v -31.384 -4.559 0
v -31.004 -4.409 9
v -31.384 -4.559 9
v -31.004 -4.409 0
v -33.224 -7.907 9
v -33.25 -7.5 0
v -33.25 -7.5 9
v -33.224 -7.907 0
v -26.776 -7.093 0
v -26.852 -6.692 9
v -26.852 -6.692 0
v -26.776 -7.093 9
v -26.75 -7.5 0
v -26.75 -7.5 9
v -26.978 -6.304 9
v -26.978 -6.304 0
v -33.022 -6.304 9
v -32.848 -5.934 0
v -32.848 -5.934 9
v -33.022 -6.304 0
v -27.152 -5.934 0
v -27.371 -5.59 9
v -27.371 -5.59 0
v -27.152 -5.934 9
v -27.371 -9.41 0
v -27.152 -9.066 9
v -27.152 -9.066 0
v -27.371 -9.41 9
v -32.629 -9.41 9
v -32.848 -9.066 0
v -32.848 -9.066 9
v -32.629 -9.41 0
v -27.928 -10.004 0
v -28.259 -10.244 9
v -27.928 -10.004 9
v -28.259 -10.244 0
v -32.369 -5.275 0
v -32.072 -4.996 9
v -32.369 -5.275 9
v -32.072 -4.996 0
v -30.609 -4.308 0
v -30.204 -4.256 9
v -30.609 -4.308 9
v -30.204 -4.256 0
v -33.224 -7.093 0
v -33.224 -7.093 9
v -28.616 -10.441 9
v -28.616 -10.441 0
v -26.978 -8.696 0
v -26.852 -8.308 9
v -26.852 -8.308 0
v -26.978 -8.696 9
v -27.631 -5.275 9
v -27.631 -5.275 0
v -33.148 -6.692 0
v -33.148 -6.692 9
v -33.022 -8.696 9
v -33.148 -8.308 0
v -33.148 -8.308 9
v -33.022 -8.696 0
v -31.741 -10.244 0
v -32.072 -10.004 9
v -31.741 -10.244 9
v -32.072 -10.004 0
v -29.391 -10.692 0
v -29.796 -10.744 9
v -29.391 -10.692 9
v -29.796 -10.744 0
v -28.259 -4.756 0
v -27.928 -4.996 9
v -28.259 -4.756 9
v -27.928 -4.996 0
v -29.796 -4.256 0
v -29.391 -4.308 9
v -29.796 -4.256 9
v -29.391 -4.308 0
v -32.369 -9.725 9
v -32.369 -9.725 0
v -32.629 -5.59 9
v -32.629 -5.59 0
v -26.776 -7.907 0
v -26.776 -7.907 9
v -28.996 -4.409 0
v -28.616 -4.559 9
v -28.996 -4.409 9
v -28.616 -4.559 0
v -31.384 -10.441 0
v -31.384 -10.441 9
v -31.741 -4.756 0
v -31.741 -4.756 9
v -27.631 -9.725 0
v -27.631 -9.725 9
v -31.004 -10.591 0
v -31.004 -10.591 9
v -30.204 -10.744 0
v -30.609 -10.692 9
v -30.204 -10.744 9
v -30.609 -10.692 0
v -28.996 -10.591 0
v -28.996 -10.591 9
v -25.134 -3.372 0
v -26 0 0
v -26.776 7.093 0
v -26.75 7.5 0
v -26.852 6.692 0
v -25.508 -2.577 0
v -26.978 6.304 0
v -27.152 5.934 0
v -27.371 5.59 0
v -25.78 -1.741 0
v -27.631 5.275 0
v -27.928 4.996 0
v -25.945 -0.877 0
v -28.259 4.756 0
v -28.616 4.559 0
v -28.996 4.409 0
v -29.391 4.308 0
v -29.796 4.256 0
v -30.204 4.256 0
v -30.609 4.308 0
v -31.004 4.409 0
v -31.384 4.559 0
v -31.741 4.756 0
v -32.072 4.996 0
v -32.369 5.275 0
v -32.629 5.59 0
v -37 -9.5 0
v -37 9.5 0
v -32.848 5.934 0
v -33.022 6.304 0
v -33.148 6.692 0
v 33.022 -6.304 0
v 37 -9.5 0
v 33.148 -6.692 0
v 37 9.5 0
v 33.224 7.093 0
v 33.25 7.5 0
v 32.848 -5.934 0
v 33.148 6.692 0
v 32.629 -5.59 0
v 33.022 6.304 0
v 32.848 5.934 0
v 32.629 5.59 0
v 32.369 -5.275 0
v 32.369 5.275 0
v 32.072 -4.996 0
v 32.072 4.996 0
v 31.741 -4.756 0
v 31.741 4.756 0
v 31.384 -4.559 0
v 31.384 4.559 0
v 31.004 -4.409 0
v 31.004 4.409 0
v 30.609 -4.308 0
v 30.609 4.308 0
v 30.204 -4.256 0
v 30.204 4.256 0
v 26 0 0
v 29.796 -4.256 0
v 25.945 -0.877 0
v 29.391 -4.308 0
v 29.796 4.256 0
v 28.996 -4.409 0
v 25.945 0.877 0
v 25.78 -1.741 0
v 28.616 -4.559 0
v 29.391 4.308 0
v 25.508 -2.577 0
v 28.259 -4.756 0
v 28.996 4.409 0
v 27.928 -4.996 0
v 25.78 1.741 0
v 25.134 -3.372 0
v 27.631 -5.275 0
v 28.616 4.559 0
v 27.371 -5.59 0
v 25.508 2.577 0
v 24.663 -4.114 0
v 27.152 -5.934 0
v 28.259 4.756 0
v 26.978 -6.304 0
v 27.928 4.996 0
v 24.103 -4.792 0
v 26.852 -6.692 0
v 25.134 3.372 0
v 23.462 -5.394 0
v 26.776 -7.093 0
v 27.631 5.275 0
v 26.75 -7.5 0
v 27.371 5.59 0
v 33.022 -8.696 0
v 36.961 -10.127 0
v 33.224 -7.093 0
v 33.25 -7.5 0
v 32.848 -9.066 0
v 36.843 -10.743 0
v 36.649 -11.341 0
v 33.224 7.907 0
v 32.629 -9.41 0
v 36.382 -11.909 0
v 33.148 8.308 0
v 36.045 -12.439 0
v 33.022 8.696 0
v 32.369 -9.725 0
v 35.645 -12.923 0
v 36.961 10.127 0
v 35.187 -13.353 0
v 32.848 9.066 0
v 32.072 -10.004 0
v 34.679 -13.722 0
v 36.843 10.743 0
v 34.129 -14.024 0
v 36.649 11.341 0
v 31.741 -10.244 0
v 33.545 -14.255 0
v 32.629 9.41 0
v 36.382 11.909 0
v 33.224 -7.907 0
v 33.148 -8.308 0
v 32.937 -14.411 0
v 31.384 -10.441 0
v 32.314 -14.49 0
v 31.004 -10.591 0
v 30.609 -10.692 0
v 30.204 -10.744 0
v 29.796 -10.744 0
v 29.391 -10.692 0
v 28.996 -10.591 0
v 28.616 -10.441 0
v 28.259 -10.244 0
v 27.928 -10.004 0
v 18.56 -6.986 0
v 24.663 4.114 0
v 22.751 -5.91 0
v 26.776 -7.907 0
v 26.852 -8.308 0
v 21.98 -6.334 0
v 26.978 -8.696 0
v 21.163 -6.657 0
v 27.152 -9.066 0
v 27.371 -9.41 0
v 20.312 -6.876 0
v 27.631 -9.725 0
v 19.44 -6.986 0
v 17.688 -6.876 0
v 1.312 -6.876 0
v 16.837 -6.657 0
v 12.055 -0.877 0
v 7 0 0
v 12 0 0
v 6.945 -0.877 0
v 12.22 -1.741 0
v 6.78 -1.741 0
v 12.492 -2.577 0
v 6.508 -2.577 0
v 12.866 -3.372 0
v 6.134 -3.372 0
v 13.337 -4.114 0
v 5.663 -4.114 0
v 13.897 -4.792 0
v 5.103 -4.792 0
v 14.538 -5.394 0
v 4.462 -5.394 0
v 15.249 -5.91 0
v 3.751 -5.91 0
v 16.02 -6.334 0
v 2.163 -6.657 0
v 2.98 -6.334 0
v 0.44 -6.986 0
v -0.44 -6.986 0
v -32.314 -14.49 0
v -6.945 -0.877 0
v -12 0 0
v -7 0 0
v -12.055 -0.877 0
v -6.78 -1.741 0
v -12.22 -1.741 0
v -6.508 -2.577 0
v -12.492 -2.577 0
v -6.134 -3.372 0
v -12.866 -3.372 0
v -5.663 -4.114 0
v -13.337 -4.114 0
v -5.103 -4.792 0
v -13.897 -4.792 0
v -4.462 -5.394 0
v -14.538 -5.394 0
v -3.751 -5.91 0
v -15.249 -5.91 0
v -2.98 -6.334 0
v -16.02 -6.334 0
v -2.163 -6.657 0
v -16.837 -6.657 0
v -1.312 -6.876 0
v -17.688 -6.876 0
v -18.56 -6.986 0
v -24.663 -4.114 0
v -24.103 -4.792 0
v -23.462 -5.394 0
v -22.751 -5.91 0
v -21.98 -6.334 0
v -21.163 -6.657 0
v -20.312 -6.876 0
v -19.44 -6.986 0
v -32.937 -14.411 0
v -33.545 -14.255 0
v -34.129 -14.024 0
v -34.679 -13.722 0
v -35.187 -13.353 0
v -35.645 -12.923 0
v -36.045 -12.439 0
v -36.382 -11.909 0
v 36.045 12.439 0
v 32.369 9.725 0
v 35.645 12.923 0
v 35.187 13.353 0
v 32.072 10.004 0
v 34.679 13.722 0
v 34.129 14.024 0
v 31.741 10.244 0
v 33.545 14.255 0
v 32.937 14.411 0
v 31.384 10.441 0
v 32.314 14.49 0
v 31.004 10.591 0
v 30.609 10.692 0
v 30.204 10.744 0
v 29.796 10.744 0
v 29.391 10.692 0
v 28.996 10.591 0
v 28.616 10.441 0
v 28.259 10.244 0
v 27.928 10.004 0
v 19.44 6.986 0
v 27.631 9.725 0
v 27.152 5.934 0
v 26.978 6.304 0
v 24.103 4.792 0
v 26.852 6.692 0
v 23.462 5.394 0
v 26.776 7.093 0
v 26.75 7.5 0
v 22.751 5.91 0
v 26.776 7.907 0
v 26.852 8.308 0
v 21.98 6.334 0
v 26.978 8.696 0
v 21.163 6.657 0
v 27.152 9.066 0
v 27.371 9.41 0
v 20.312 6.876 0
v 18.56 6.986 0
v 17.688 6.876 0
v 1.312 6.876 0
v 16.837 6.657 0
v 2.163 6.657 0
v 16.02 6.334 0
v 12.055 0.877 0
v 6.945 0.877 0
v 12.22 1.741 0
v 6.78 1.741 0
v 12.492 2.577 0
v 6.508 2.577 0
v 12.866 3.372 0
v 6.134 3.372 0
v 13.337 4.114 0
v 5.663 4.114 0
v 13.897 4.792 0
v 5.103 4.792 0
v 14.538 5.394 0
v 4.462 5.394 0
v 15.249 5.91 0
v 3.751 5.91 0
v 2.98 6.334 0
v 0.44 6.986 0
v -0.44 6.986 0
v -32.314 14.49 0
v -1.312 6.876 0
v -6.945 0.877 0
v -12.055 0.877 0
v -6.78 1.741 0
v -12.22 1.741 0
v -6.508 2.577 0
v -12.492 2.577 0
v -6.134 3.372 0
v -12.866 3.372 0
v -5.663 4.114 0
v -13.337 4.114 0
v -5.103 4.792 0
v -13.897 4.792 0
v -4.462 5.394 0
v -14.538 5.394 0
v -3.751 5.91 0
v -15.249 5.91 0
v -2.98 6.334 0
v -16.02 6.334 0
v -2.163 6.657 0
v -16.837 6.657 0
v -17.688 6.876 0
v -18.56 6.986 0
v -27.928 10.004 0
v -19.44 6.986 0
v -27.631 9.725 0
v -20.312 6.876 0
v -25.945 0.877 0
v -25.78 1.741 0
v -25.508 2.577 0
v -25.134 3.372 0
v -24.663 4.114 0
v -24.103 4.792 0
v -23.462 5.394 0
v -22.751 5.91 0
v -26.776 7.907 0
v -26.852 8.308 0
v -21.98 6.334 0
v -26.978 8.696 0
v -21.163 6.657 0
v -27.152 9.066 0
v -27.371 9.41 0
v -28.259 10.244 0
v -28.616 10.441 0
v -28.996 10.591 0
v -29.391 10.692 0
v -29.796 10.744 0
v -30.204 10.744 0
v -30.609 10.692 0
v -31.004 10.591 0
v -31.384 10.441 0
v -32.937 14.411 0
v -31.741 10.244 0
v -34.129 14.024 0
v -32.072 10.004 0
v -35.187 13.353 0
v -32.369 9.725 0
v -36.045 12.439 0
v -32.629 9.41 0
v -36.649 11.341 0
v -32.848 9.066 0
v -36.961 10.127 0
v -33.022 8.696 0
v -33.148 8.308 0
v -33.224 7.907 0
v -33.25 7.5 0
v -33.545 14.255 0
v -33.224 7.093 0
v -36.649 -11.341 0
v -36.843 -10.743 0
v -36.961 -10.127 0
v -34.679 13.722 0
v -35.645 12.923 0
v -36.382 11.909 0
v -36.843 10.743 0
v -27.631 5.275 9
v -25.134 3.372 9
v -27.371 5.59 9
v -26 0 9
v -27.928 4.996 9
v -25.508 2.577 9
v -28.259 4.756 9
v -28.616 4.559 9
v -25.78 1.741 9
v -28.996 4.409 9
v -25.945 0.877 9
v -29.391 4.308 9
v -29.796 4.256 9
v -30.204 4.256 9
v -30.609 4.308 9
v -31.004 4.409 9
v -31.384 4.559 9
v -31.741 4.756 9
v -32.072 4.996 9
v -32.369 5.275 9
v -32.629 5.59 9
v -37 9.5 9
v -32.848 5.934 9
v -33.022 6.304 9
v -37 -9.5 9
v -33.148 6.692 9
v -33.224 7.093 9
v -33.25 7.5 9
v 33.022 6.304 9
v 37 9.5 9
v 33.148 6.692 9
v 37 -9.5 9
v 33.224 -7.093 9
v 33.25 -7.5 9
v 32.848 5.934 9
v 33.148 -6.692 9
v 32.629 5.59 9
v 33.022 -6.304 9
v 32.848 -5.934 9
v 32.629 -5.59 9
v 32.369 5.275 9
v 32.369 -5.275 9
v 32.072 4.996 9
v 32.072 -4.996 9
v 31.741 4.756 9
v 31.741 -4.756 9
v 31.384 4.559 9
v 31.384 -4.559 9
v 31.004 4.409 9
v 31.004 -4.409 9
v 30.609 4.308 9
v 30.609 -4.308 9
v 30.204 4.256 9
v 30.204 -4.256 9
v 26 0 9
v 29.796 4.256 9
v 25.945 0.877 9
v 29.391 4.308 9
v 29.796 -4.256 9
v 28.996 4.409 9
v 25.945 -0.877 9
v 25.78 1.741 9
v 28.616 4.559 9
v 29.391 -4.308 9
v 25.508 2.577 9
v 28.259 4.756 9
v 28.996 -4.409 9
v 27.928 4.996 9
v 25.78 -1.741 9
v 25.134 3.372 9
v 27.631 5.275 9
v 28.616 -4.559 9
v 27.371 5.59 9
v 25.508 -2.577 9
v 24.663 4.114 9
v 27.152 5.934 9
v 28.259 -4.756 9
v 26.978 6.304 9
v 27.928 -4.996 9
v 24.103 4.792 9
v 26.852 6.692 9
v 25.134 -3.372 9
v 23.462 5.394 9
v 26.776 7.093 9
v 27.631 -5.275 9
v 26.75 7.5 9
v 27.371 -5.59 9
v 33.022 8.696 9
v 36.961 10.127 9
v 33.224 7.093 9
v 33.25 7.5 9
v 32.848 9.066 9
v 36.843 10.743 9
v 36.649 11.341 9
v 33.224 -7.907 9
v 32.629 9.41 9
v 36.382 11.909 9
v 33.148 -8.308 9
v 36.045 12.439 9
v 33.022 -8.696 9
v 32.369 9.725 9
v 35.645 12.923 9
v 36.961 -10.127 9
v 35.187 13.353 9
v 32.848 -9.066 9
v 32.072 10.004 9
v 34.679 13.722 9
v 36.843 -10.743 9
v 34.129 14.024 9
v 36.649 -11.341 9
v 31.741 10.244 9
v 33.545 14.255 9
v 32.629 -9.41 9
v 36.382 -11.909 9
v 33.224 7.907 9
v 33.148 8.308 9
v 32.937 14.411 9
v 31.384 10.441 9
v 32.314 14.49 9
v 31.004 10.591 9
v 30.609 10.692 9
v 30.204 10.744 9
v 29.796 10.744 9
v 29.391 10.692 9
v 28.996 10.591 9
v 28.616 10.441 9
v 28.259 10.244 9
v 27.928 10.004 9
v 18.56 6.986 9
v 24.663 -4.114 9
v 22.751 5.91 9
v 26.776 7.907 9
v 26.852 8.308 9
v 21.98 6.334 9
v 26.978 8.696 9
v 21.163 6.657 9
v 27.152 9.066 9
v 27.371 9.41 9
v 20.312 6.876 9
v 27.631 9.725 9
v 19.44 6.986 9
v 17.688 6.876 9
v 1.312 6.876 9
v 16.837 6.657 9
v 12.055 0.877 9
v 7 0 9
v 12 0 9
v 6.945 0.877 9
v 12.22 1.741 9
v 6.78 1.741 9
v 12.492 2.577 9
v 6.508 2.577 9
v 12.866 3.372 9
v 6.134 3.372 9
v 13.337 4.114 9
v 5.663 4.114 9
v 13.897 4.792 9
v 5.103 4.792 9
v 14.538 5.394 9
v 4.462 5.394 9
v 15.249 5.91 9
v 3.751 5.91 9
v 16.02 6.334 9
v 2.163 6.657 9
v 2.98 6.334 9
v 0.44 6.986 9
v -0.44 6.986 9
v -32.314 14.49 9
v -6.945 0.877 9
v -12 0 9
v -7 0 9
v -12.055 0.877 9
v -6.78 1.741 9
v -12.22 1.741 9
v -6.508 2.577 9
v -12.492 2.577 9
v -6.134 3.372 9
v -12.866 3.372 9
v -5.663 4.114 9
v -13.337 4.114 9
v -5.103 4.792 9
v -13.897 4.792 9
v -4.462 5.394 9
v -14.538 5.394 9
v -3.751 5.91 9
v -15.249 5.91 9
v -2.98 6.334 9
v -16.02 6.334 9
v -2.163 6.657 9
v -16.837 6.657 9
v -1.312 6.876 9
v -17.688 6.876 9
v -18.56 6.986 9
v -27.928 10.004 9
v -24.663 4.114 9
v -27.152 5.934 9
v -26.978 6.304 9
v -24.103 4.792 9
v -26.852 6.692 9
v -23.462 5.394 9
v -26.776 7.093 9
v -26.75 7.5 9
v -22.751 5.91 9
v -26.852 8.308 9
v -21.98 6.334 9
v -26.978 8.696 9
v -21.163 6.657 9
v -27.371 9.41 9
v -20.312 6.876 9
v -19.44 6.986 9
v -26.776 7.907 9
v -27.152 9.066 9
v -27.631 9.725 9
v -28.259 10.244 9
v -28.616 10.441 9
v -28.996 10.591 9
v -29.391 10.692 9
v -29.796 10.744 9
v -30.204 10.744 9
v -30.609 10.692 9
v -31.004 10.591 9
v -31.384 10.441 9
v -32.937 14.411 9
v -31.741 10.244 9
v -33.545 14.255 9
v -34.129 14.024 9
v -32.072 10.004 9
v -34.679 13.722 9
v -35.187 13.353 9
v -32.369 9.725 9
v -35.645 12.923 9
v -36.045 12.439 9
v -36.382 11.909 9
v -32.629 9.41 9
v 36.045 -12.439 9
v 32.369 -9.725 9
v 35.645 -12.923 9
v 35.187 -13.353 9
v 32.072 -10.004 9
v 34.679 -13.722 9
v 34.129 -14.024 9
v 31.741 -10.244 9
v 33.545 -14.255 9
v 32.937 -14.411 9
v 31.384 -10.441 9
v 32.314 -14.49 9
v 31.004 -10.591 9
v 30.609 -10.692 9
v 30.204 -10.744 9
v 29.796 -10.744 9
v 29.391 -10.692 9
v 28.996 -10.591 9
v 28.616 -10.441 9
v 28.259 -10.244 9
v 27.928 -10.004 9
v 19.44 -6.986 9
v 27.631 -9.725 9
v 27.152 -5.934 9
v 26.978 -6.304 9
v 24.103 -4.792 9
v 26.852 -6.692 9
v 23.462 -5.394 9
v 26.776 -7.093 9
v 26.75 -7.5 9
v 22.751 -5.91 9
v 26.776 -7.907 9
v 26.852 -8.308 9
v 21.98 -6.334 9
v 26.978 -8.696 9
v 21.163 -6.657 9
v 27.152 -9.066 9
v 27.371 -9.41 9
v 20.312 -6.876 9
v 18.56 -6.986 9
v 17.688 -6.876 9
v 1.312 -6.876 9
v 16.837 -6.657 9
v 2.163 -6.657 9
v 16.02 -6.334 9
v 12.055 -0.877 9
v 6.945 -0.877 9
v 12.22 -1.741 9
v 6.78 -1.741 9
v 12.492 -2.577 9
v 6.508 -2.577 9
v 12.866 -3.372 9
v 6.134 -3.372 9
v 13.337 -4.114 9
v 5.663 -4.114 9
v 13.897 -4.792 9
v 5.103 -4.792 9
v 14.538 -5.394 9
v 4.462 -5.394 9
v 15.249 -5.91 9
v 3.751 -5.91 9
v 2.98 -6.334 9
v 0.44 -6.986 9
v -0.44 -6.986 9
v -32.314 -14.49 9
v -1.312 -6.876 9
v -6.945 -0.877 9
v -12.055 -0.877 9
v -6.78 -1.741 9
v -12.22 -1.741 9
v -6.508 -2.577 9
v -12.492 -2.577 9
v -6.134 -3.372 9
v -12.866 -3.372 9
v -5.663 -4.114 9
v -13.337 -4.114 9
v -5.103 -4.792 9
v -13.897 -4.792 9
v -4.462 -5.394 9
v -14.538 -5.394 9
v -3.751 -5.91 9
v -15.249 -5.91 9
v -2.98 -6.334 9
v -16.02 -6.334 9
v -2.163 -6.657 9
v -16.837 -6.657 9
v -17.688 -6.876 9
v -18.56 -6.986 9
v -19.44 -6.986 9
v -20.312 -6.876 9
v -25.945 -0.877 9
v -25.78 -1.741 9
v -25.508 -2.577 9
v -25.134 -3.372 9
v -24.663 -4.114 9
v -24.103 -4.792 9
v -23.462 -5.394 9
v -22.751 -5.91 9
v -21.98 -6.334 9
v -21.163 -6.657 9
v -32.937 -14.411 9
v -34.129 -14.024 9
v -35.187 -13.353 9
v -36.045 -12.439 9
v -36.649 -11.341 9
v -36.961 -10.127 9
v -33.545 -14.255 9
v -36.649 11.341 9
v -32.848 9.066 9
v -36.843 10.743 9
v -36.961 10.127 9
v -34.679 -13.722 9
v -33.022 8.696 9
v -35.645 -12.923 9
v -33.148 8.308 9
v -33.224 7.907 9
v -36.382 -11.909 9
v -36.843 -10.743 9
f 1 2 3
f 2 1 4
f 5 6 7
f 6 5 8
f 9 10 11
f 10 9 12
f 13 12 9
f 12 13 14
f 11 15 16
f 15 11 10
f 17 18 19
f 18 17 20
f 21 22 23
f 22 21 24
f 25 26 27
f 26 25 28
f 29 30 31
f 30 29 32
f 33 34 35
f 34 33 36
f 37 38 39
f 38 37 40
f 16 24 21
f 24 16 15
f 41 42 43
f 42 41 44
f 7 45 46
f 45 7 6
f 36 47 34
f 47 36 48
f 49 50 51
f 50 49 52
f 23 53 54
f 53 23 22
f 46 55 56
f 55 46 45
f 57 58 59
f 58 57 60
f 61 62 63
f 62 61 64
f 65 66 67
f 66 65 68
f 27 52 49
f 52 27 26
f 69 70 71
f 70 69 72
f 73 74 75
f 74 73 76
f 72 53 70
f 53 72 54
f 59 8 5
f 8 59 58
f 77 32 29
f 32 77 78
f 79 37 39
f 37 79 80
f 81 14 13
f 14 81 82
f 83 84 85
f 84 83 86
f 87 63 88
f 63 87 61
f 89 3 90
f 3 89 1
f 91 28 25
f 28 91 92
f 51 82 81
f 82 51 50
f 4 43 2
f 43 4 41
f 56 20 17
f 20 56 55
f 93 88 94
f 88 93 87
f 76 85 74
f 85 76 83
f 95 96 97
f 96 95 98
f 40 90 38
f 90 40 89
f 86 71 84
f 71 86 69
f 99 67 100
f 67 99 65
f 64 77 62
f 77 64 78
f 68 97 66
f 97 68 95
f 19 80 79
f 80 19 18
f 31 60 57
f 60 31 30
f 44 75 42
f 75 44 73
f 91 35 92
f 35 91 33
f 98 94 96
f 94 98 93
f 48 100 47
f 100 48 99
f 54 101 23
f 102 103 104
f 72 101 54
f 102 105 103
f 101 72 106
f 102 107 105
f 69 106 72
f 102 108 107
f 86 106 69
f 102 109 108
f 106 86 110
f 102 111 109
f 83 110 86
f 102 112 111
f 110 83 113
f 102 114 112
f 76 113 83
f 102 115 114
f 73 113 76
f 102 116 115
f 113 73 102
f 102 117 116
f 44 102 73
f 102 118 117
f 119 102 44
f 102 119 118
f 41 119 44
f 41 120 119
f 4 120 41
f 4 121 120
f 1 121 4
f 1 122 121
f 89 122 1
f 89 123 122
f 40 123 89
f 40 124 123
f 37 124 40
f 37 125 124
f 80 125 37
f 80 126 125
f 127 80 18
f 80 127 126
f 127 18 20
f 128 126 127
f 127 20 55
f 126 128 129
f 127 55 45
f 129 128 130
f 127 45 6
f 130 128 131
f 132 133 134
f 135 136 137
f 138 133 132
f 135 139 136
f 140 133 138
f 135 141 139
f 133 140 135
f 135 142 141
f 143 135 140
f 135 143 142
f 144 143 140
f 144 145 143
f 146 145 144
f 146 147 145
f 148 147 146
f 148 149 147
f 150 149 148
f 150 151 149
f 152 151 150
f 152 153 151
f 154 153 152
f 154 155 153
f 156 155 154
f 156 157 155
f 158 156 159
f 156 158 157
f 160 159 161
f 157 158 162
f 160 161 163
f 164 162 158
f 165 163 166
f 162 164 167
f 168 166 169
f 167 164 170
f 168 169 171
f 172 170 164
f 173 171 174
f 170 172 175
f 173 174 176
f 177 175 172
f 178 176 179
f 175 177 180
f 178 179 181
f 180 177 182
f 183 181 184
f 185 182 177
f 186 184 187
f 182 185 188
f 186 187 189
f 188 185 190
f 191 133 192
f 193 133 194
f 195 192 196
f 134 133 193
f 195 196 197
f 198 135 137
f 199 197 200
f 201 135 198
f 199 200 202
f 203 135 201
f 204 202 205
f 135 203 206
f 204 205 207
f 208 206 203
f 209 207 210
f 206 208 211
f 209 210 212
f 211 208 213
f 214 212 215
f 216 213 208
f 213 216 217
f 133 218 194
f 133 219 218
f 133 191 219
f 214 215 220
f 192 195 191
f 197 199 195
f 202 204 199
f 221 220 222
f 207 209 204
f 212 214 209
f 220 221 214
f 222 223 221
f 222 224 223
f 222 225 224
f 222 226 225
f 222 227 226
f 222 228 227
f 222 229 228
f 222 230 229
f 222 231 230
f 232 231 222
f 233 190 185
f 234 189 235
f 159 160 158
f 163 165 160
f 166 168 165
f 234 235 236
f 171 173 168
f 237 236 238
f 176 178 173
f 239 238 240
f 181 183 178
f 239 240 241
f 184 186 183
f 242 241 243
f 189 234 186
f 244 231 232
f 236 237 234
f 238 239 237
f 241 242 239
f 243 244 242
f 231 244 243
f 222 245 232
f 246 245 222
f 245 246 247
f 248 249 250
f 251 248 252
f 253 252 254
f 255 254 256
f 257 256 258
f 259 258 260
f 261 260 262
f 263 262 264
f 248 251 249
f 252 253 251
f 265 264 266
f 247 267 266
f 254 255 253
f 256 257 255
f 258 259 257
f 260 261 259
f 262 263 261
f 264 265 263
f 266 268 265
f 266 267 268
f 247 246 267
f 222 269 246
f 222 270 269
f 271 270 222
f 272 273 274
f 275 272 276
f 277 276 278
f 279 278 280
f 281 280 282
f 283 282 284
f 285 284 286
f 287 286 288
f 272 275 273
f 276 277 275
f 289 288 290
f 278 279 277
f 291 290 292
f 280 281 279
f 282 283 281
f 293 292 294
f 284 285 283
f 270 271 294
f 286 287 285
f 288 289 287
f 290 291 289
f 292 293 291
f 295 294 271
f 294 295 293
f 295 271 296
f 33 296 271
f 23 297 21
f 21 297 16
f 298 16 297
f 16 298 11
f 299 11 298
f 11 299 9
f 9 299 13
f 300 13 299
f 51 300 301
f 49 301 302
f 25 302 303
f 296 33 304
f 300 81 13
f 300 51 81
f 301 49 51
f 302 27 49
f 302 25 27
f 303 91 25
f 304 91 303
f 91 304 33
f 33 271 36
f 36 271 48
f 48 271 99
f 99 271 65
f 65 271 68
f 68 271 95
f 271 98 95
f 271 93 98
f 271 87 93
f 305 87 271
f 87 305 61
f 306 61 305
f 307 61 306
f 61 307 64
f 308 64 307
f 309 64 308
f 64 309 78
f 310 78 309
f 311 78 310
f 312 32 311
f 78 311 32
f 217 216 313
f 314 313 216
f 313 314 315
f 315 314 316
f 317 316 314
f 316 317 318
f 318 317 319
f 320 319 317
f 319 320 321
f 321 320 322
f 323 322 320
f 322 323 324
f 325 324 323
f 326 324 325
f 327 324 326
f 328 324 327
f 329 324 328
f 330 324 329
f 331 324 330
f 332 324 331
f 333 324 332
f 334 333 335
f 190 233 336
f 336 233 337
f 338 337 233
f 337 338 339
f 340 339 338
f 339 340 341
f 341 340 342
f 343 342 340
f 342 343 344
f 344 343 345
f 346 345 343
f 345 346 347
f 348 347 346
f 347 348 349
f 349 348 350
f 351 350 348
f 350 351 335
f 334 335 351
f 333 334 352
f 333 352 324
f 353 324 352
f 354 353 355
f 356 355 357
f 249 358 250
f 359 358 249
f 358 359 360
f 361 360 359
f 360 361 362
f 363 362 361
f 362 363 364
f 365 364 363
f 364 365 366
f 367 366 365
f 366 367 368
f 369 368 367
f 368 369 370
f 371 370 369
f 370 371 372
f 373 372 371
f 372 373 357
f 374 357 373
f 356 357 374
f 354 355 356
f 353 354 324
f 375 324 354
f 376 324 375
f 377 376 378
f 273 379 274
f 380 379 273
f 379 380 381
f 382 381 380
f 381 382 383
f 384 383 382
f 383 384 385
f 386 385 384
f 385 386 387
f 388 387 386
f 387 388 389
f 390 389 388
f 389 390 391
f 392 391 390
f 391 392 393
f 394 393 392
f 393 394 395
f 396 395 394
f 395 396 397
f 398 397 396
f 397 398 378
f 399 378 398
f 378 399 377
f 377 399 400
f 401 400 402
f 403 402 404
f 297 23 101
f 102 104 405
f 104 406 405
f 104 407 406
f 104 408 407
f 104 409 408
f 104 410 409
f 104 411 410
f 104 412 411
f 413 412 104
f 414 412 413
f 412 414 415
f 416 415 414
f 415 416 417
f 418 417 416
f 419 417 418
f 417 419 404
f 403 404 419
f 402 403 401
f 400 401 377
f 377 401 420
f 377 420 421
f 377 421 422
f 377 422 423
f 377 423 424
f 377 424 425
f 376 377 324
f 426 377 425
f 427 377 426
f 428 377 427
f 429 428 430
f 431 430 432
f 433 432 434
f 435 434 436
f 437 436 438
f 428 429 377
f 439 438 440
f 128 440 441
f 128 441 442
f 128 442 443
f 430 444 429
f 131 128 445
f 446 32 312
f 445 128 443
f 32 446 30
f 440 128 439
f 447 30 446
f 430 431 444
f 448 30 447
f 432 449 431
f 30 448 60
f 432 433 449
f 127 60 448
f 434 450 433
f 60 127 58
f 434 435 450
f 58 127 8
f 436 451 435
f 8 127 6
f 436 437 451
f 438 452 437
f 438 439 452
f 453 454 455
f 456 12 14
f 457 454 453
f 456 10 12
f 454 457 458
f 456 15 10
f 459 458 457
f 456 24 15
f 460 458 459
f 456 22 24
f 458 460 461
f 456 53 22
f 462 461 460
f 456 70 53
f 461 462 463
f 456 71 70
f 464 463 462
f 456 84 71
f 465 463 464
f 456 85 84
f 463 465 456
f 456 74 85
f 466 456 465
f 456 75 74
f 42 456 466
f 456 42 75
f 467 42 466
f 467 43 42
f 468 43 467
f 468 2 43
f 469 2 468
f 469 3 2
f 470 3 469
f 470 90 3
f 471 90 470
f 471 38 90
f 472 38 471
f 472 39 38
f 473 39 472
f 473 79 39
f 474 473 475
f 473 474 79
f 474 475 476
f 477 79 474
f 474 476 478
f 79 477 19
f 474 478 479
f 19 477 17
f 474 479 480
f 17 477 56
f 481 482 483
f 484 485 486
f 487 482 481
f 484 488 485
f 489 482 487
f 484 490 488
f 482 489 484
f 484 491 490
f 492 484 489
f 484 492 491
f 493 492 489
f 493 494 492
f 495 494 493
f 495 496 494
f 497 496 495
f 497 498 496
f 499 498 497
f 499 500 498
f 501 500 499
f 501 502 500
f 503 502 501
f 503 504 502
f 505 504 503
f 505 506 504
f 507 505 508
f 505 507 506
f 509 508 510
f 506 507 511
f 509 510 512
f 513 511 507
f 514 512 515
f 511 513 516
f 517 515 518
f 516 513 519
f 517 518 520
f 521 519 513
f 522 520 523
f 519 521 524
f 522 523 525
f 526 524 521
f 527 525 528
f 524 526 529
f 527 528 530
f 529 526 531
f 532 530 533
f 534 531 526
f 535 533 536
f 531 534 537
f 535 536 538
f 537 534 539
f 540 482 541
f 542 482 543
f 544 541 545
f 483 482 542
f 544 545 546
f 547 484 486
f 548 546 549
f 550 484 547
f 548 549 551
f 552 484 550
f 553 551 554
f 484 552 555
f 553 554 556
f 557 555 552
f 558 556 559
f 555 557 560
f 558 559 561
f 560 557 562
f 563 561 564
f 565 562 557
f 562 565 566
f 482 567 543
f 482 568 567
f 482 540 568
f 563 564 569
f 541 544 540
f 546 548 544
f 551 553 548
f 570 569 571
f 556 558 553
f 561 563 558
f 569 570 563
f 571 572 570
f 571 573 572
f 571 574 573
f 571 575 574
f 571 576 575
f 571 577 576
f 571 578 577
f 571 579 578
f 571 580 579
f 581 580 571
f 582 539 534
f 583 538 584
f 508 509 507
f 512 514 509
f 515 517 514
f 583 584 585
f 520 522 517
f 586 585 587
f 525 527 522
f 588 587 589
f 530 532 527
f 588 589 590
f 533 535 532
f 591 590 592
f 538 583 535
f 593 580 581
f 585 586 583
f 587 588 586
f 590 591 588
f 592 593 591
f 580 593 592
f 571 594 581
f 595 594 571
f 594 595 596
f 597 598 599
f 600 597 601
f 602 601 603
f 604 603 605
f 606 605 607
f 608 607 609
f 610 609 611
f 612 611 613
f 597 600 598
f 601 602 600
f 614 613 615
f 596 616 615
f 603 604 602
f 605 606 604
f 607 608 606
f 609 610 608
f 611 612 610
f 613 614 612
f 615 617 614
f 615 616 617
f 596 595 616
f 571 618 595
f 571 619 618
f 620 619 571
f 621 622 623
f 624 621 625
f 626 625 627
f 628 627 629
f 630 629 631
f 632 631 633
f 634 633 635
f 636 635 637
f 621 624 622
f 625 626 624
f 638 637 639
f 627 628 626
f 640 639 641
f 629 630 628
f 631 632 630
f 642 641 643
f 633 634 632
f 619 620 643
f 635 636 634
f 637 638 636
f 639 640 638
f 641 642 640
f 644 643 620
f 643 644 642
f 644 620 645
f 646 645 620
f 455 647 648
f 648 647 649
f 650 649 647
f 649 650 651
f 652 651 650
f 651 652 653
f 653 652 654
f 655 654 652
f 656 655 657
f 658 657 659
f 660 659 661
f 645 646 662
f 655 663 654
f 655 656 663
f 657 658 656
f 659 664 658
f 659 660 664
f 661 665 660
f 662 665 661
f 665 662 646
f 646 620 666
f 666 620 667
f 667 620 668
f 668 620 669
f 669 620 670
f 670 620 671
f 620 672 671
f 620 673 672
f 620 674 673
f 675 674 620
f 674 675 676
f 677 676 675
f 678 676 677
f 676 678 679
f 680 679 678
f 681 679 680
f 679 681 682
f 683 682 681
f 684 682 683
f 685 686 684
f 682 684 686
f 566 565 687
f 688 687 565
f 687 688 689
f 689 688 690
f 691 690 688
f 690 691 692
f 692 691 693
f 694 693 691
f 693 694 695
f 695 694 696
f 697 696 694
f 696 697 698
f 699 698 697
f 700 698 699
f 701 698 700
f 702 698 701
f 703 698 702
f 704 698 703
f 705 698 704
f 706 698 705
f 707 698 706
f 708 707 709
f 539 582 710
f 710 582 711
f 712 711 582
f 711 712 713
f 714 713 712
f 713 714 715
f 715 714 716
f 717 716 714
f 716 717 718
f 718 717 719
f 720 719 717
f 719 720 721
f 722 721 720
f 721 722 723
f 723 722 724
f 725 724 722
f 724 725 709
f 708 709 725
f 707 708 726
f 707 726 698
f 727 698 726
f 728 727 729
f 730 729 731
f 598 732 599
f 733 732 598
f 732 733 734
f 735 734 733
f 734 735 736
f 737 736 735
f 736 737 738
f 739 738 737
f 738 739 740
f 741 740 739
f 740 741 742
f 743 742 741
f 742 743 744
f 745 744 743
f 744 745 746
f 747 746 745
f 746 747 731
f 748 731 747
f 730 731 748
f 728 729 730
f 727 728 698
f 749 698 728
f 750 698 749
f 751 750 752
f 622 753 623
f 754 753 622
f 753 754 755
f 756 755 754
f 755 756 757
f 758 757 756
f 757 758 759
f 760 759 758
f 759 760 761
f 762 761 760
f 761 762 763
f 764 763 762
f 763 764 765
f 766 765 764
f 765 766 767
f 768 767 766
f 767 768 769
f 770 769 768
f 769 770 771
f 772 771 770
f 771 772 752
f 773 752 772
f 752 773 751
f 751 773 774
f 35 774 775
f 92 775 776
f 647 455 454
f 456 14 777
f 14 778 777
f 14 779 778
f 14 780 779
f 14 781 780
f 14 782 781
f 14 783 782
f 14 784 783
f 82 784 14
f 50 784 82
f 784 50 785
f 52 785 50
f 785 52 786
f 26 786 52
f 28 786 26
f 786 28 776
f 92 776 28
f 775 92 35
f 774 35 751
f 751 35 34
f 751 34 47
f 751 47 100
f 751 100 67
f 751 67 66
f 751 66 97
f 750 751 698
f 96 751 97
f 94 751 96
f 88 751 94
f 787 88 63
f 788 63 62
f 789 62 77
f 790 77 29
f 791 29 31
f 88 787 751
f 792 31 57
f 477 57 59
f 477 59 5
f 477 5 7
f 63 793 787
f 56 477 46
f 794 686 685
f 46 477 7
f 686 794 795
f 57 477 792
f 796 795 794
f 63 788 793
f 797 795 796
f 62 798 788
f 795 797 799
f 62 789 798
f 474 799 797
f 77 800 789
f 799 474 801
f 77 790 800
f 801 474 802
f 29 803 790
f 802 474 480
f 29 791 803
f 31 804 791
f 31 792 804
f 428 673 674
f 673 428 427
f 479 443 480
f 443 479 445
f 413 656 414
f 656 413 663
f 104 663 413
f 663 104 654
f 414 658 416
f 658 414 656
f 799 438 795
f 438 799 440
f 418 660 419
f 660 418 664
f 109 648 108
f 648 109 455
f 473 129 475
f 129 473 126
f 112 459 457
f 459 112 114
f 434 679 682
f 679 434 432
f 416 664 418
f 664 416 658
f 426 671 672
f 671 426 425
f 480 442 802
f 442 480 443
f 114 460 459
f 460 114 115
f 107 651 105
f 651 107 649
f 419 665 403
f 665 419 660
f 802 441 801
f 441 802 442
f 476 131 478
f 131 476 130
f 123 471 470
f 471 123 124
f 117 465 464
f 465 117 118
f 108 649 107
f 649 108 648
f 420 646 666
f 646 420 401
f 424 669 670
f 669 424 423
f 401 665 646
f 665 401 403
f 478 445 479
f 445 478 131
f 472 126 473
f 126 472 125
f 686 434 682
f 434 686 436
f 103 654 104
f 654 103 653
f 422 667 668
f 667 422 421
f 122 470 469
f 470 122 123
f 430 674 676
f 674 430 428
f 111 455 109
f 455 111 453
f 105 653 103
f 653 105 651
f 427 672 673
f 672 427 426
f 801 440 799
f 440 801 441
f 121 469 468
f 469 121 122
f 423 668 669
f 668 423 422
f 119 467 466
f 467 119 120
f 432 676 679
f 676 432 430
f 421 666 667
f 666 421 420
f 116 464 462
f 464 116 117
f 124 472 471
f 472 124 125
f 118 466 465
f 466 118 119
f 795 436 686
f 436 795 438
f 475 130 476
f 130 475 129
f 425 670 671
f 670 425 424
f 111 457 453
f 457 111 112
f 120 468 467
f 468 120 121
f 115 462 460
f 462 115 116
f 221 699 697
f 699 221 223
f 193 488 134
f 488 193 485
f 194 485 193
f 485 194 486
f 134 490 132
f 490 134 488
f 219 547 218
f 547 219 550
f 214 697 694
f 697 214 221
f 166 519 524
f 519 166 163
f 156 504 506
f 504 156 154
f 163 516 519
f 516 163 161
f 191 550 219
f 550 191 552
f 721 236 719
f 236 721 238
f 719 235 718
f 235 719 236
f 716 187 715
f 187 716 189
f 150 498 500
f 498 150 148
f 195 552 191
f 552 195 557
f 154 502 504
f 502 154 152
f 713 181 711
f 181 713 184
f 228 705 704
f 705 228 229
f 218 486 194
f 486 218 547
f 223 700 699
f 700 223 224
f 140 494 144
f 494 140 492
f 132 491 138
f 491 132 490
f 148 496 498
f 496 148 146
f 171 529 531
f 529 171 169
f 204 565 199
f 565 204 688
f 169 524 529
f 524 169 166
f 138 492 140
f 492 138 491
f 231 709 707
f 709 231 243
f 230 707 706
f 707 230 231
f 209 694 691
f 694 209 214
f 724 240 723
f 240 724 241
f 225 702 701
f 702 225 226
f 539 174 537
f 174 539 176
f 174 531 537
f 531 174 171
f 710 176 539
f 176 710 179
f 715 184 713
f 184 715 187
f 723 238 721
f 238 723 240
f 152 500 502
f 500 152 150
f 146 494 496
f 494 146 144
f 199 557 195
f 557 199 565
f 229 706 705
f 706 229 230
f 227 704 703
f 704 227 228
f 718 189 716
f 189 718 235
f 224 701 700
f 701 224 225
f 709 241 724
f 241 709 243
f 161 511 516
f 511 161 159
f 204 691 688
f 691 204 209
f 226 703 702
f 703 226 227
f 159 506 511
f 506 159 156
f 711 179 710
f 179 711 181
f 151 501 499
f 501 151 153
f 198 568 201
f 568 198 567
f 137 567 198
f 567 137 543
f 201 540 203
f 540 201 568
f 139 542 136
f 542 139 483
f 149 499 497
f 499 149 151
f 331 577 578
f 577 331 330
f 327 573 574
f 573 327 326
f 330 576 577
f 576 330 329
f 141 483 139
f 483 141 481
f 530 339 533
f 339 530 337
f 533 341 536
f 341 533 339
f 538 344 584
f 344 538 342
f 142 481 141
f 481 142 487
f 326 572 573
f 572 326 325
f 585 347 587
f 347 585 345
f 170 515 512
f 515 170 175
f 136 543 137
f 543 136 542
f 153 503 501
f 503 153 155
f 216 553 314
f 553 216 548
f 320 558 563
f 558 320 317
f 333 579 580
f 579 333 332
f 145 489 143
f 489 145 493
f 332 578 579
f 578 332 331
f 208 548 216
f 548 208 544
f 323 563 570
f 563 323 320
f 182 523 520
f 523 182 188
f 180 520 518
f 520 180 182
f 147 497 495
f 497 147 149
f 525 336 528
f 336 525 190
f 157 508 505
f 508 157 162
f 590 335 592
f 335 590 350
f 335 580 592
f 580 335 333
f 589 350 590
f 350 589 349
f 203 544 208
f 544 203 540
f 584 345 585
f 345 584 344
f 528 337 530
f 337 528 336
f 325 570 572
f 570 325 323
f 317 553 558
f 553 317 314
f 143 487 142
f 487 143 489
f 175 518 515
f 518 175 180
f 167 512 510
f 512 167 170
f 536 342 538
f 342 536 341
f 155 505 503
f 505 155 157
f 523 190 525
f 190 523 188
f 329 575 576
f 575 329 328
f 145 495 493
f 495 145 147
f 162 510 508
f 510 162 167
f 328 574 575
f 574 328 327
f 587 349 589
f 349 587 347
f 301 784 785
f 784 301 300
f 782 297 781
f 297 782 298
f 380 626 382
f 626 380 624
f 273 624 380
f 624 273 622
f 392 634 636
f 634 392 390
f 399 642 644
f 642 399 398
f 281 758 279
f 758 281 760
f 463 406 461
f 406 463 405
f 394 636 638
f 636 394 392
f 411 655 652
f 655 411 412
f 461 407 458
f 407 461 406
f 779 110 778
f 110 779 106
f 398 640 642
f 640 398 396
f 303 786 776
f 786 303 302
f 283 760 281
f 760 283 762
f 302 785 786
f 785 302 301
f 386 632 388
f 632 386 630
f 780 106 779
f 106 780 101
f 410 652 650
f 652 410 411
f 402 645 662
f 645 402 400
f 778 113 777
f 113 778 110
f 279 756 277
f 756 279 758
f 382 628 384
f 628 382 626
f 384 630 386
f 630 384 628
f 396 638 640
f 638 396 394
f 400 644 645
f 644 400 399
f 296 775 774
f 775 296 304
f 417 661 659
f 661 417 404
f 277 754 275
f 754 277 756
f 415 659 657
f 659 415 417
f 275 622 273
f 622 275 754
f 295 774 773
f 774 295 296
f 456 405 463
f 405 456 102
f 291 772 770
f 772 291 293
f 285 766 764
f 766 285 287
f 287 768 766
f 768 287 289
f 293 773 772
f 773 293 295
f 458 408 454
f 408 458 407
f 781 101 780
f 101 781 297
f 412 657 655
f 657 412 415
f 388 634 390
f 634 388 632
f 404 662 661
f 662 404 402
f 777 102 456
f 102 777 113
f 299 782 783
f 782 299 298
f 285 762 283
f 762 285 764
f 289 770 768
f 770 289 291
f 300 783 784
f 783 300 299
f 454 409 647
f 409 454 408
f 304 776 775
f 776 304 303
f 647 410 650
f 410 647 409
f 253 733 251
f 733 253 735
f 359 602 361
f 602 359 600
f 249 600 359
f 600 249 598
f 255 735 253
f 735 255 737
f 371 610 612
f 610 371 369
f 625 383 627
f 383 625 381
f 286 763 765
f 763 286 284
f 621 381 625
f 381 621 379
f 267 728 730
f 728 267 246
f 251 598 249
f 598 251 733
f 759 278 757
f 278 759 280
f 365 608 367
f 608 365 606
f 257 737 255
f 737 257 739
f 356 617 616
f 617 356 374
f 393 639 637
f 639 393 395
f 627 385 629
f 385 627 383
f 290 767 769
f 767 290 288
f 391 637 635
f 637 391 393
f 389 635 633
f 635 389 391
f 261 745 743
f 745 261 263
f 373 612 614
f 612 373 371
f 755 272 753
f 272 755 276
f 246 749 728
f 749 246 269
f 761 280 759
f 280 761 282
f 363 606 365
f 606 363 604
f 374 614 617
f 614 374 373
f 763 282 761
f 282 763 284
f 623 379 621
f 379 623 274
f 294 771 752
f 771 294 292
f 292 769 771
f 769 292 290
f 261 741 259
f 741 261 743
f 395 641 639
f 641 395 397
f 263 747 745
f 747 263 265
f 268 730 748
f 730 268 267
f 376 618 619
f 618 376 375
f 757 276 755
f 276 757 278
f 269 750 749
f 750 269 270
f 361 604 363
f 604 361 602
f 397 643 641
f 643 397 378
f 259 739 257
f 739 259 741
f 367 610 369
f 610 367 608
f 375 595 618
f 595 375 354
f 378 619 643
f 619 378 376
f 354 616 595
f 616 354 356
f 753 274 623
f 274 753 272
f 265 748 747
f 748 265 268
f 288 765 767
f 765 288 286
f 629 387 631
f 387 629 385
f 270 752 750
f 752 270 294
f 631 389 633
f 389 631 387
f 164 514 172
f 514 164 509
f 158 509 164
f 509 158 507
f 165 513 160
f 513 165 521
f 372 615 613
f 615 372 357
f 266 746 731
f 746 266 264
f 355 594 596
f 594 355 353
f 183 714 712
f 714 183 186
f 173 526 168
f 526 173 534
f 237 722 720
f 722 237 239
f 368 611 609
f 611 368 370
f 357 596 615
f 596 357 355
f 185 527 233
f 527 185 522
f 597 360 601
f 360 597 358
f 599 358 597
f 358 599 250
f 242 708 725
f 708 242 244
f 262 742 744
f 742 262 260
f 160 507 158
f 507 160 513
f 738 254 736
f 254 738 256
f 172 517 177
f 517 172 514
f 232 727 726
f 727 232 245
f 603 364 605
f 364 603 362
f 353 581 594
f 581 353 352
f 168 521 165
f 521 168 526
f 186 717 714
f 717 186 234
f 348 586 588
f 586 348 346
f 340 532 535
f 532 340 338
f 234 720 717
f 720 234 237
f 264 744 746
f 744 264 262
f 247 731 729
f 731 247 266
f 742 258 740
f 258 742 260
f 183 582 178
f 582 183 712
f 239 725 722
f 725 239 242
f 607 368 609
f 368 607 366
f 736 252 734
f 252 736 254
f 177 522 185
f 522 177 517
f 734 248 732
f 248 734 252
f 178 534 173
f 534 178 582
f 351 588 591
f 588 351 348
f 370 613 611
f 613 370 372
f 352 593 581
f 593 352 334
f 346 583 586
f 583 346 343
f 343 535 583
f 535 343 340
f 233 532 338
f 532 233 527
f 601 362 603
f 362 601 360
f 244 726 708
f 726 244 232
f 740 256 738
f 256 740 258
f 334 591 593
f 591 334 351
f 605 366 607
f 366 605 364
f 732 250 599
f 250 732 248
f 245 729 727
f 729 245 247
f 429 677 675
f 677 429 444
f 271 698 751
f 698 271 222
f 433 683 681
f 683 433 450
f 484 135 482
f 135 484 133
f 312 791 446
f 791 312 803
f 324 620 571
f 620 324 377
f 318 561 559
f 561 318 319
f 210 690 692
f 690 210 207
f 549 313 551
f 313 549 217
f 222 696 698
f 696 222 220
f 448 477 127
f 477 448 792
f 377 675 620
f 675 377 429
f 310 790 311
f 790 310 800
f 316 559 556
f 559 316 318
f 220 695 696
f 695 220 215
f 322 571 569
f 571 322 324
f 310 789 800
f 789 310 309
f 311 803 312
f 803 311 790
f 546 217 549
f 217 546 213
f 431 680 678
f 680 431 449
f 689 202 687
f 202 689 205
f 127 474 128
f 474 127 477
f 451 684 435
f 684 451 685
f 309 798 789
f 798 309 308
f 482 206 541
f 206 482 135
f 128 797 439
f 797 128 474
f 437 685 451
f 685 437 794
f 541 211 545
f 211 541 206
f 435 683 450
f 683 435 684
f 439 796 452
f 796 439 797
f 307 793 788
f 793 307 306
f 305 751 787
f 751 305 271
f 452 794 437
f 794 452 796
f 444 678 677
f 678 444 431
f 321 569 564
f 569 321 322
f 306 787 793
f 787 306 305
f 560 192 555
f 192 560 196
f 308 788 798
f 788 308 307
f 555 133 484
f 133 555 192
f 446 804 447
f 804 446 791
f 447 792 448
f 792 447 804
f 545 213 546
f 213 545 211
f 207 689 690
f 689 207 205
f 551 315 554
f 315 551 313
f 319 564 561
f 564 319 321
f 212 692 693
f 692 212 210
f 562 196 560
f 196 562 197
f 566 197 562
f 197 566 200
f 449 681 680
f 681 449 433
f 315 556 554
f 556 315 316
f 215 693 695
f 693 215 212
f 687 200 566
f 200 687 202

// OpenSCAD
$fn = 50;

difference() {
	union() {
		hull() {
			translate(v = [-32.0, 9.5, 0]) {
				cylinder(h = 9, r = 5);
			}
			translate(v = [32.0, 9.5, 0]) {
				cylinder(h = 9, r = 5);
			}
			translate(v = [-32.0, -9.5, 0]) {
				cylinder(h = 9, r = 5);
			}
			translate(v = [32.0, -9.5, 0]) {
				cylinder(h = 9, r = 5);
			}
		}
	}
	union() {
		translate(v = [-30.0, -7.5, 0]) {
			cylinder(h = 9, r = 3.25);
		}
		translate(v = [-30.0, 7.5, 0]) {
			cylinder(h = 9, r = 3.25);
		}
		translate(v = [30.0, -7.5, 0]) {
			cylinder(h = 9, r = 3.25);
		}
		translate(v = [30.0, 7.5, 0]) {
			cylinder(h = 9, r = 3.25);
		}
		translate(v = [-19.0, 0, 0.0]) {
			cylinder(h = 9, r = 7.0);
		}
		cylinder(h = 9, r = 7.0);
		translate(v = [19.0, 0, 0.0]) {
			cylinder(h = 9, r = 7.0);
		}
	}
}
